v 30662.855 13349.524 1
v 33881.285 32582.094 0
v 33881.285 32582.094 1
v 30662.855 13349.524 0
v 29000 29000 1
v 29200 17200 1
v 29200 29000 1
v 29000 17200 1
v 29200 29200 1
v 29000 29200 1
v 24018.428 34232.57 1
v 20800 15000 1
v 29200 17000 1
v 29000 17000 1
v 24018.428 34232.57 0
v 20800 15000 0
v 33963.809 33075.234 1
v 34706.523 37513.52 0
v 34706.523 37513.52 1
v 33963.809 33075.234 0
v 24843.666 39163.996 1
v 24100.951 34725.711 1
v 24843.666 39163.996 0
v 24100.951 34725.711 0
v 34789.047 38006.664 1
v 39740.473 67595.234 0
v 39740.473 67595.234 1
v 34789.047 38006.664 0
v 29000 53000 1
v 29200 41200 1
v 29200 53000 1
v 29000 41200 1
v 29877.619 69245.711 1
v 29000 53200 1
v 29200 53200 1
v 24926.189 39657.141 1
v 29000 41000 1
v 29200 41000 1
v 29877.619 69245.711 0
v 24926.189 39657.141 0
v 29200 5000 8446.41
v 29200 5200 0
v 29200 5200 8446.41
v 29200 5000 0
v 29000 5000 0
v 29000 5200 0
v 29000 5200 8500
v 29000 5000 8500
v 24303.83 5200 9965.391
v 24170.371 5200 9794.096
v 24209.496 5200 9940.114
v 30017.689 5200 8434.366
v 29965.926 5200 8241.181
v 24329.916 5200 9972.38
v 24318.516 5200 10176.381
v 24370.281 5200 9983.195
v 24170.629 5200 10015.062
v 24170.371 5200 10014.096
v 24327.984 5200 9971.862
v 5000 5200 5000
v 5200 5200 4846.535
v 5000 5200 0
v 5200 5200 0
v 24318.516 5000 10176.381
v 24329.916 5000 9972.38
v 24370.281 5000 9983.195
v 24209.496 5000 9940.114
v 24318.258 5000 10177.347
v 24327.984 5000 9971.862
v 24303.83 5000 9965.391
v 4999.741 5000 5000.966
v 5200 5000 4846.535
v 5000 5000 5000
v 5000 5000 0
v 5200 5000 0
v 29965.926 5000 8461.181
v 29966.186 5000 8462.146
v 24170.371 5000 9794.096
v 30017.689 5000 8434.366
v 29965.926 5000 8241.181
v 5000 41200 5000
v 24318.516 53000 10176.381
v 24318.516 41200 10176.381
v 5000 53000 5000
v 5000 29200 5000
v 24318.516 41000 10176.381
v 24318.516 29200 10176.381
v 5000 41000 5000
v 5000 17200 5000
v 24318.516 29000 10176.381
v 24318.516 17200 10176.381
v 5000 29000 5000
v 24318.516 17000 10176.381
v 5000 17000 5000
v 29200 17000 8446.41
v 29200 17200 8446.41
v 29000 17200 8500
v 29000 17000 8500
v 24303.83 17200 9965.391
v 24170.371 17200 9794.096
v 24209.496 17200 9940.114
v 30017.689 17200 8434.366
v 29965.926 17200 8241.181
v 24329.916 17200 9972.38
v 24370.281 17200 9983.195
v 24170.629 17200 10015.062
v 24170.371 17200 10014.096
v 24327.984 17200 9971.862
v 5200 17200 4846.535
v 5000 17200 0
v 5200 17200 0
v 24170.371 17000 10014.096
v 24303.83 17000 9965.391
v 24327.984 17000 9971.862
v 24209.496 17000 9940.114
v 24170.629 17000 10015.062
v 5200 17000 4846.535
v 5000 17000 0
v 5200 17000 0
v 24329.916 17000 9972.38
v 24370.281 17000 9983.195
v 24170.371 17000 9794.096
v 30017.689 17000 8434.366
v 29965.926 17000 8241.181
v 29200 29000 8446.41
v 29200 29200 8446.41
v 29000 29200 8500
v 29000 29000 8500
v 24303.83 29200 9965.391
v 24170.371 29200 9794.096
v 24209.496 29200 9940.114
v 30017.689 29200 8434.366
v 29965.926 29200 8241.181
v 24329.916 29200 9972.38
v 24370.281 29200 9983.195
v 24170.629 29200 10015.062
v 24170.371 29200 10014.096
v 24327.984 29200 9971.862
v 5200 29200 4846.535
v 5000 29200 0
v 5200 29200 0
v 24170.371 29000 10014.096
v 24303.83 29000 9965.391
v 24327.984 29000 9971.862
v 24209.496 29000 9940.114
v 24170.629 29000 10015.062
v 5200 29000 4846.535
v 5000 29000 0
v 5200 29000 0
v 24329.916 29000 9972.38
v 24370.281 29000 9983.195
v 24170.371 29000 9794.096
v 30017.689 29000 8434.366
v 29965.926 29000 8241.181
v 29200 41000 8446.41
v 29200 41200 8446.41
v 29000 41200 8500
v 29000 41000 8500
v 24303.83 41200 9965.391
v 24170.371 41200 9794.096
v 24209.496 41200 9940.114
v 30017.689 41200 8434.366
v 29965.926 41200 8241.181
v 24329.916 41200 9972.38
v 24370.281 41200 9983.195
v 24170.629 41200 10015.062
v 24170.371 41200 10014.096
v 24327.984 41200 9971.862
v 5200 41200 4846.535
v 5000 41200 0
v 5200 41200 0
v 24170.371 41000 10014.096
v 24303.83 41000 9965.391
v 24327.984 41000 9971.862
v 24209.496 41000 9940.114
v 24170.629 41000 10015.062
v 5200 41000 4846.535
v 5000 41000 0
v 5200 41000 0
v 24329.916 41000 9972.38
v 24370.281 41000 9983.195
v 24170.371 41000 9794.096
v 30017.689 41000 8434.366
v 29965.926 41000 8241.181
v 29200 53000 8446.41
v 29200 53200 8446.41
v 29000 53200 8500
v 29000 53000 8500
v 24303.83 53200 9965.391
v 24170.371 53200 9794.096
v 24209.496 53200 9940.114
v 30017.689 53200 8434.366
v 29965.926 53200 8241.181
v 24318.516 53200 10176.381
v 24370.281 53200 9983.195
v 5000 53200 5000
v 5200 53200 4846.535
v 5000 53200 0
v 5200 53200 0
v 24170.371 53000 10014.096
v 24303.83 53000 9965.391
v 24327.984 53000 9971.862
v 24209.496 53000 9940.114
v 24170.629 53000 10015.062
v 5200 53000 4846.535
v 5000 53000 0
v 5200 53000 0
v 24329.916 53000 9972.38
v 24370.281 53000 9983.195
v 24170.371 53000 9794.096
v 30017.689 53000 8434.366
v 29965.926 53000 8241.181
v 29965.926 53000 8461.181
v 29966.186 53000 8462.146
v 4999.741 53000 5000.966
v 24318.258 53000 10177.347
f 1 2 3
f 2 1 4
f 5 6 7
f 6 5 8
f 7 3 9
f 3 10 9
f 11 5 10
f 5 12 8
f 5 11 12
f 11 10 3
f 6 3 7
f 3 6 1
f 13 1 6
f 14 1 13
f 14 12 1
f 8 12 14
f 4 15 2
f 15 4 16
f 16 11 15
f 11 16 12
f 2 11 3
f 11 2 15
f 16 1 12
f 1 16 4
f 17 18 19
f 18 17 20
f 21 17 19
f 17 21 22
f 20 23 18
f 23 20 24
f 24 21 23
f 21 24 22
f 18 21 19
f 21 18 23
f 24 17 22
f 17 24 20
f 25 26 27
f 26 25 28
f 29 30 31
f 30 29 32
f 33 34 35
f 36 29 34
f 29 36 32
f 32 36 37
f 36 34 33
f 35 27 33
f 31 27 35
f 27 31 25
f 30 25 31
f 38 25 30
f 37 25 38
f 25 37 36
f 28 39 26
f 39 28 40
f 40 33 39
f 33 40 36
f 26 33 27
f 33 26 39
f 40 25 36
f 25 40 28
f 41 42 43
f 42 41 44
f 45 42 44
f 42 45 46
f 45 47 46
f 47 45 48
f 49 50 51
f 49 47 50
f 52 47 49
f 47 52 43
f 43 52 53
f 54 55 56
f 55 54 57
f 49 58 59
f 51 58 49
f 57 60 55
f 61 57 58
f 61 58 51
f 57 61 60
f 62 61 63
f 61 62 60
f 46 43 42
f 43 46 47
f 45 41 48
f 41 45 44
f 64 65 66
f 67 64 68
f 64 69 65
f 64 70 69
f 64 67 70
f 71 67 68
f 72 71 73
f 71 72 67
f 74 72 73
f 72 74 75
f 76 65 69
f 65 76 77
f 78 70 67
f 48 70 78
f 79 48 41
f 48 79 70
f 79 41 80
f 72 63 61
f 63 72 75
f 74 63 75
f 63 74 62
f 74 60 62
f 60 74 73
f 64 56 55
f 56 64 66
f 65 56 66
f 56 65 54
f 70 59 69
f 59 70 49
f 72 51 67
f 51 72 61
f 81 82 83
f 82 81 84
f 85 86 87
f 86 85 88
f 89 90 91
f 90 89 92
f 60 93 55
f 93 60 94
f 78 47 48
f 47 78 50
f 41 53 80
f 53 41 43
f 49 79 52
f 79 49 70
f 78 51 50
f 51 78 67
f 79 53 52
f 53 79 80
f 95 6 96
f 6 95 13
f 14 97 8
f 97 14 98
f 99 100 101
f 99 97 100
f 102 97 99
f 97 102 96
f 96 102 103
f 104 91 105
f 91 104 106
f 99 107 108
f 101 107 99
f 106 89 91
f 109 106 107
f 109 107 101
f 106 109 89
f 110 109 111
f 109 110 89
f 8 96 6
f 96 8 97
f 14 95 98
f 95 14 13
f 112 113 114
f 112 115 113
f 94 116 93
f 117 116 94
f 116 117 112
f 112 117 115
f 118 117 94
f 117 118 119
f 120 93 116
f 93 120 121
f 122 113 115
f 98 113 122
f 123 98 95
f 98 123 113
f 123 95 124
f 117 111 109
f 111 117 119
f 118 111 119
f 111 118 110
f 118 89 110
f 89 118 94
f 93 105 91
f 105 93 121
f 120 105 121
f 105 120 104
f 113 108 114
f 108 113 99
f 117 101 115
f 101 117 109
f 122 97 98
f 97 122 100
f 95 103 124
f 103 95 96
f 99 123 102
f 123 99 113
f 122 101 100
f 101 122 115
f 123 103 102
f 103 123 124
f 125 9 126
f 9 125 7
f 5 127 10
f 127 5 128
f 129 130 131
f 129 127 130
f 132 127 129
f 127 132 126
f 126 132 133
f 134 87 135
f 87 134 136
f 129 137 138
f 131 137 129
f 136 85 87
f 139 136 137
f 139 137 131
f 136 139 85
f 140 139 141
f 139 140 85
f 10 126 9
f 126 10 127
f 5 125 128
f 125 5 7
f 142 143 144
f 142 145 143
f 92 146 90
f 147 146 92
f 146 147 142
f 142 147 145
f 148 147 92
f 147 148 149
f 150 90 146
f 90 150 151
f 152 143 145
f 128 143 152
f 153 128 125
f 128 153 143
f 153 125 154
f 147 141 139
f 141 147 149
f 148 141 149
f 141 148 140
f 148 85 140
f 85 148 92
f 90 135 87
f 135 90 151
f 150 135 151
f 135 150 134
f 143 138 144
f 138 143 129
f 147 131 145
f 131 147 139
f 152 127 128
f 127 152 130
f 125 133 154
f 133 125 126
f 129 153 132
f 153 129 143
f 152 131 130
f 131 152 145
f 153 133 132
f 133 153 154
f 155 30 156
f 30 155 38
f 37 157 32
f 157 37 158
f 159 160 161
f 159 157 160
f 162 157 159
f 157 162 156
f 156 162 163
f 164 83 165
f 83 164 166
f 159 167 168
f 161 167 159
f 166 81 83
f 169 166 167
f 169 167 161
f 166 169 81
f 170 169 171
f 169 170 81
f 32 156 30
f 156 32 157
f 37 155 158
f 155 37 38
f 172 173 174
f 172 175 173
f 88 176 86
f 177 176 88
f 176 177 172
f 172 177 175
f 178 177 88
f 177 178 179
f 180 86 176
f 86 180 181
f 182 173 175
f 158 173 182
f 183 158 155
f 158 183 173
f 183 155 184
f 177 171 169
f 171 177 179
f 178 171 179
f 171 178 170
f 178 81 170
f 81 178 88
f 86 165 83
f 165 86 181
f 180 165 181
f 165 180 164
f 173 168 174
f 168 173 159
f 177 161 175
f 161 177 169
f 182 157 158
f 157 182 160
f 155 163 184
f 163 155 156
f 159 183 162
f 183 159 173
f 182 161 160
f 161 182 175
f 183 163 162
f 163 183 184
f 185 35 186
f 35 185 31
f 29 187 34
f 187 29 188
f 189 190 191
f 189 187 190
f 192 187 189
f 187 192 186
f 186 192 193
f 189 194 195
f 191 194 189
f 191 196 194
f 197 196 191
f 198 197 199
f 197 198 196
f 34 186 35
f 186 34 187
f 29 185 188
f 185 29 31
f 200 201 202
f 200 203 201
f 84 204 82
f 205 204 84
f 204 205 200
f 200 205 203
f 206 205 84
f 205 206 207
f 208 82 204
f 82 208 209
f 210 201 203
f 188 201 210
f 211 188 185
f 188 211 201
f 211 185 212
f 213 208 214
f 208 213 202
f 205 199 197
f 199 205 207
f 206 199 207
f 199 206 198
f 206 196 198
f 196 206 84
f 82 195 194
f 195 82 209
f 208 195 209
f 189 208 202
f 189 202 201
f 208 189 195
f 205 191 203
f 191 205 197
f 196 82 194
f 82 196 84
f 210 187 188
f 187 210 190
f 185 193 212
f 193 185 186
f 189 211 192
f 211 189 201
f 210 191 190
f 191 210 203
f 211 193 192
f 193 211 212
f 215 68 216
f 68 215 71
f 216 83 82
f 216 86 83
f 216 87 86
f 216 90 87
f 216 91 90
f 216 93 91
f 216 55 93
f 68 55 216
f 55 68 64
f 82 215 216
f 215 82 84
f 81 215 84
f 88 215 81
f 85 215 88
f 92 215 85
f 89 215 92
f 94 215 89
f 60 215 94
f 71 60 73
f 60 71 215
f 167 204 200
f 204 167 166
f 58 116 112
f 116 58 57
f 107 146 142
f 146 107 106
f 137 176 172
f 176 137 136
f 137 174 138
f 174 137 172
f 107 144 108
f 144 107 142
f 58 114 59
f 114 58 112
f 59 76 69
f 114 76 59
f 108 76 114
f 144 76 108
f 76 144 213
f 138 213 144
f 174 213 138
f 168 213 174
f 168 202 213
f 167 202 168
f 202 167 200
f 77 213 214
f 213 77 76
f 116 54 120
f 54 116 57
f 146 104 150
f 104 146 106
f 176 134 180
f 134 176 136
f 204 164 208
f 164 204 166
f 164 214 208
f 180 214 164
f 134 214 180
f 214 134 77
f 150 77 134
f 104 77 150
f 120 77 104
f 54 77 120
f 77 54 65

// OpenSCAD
o_hangar_lg=10000;
o_hangar_l=55000;
o_hangar_h=6000;
o_hangar_t = 5000;

toit = true;

module o_trave(){
    translate([0/2, 0])cube([200,200, o_hangar_h]);
    translate([o_hangar_lg, 0])cube([200,200, o_hangar_h]);
    translate([0, 0, o_hangar_h]) rotate([0,90-30,0])cube([200,200, 5600]);
    translate([o_hangar_lg+3000, 0, 5000]) rotate([0,-90+25,0])cube([200,200, 9000]);
}


module o_hangar(){
    translate([0, 0, 0]) cube([o_hangar_lg,        o_hangar_l, 1]);
    for(i=[0:11]){
        translate([0, i*o_hangar_t, 0]) o_trave();
    }
    
    if(toit){
        translate([0, 0, o_hangar_h]) rotate([0,-30,0])cube([5600,o_hangar_l, 1]);
        translate([o_hangar_lg+3000, 0, 5000+200]) rotate([0,180+25,0])cube([9000,o_hangar_l, 1]);
    }
}

module o_hangar_bas(){
    translate([0, 0, 0]) cube([o_hangar_lg, o_hangar_t*4-500, 1]);
    translate([0, o_hangar_t*4, 0]) cube([o_hangar_lg, o_hangar_t-500, 1]);
    translate([0, o_hangar_t*5, 0]) cube([o_hangar_lg, o_hangar_t*6, 1]);
}

module o_hangar2(){
    translate([0, 0, 0]) cube([o_hangar_lg, o_hangar_t*4-500, 1]);
    
    translate([0, o_hangar_t*4, 0]) union(){
        cube([o_hangar_lg, o_hangar_t*7, 1]);
        for(i=[0:7]){
            translate([0, i*o_hangar_t, 0]) o_trave();
        }
        
        if(toit){
            translate([0, 0, o_hangar_h]) rotate([0,-30,0])cube([5600,o_hangar_t*7, 1]);
            translate([o_hangar_lg+3000, 0, 5000+200]) rotate([0,180+25,0])cube([9000,o_hangar_t*7, 1]);
        }
    }
}





/*module trave_m(){
    translate([lg_hangar, 0])cube([200,200, h2]);
    translate([0, 0])cube([200,200, h1]);
    translate([0, 0, h1]) rotate([0,90-angle,0])cube([200,200, l3]);
    translate([lg_hangar, 0, h2]) rotate([0,-90+angle,0])cube([200,200, l4]);
    
}*/

/*module trave_b(){
    h_b = 7000;
    translate([lg_hangar, 0]) translate([-200, 0])cube([200,200, h_b]);
    translate([0, 0]) cube([200,200, h_b]);
    translate([0, 0, h_b]) rotate([0,90-22,0])cube([200,200, 9000]);
    translate([lg_hangar, 0, h_b]) rotate([0,-90+22,0]) translate([-200, 0])cube([200,200, 9000]);
    
}*/

h_b = 6000;
nb_travee = 7;
lg_hangar_b = 24000;
travee_l_b = 12000;
angle_b = 22/100*90;
l_toit_b = 11500;
l_hangar_b = nb_travee*travee_l_b;


module trave_b(){
    translate([lg_hangar_b, 0]) translate([-200, 0])cube([200,200, h_b]);
    translate([0, 0]) cube([200,200, h_b]);
    translate([0, 0, h_b]) rotate([0,90-angle_b,0])cube([200,200, l_toit_b]);
    translate([lg_hangar_b, 0, h_b]) rotate([0,-90+angle_b,0]) translate([-200, 0])cube([200,200, l_toit_b]);
    
}

module hangar_bipente(){
    for(i =[0:nb_travee]){
        translate([0, i*travee_l_b, 0]) trave_b();
    
    }
    if(toit){
        translate([0, 0, h_b]) rotate([0,-angle_b,0])cube([l_toit_b,l_hangar_b, 1]);
        translate([lg_hangar_b, 0, h_b]) rotate([0,-90+angle_b,0])cube([1,l_hangar_b, l_toit_b]);
    }
    
}


lg_hangar_m = 24000;
h1_m = 5000;
h2_m = 8500;

h_m_ = 9400;
l_m_ = 17500;

angle_m = 15;
l3_m = 20000;
l4_m = 6000;

travee_l1_m = 12000;
nb_travee_m = 4;
l_hangar_m = travee_l1_m*nb_travee_m;


module trave_m(){
    translate([lg_hangar_m, 0])cube([200,200, h2]);
    translate([0, 0])cube([200,200, h1]);
    translate([0, 0, h1]) rotate([0,90-angle,0])cube([200,200, l3_m]);
    translate([lg_hangar_m, 0, h2]) rotate([0,-90+angle,0])translate([0,0,-1000])cube([200,200, l4_m]);
}

module hangar_m(){
    ///translate([0, 0, 0]) cube([lg_hangar, l_hangar, 1]);

    for(i =[0:nb_travee_m]){
        translate([0, i*travee_l1_m, 0]) trave_m();
    
    }
    if(toit){
        translate([0, 0, h1]) rotate([0,-angle,0])cube([l3_m,l_hangar_m, 1]);
        translate([lg_hangar_m, 0, h2+220]) rotate([0,-90+angle,0])translate([0,0,-1000])cube([1,l_hangar_m, l4_m]);
    }
    
}

lg_hangar = 20000;
l_hangar = 84000;
h1 = 5000;
h2 = 8500;

h_ = 9400;
l_ = 17500;

angle = 15;
l3 = 18000;
l4 = 4000;

travee_l1 = 6000;

module trave_wolf(){
    translate([lg_hangar, 0])cube([200,200, h2]);
    translate([0, 0])cube([200,200, h1]);
    translate([0, 0, h1]) rotate([0,90-angle,0])cube([200,200, l3]);
    translate([lg_hangar, 0, h2]) rotate([0,-90+angle,0])translate([0,0,-1000])cube([200,200, l4]);
}

module hangar_wolf(){
    ///translate([0, 0, 0]) cube([lg_hangar, l_hangar, 1]);



    trave_wolf();
    translate([0, 2*travee_l1, 0]) trave_wolf();
    translate([0, 4*travee_l1, 0]) trave_wolf();
    translate([0, 6*travee_l1, 0]) trave_wolf();
    translate([0, 8*travee_l1, 0]) trave_wolf();
    translate([0, 10*travee_l1, 0]) trave_wolf();
    translate([0, 12*travee_l1, 0]) trave_wolf();
    translate([0, 14*travee_l1, 0]) trave_wolf();
    
    if(toit){
        translate([0, 0, h1]) rotate([0,-angle,0])cube([l3,l_hangar, 1]);
        translate([lg_hangar, 0, h2+220]) rotate([0,-90+angle,0])translate([0,0,-1000])cube([1,l_hangar, l4]);
    }
    
}


module f_wolf(){
    translate([lg_hangar, 0]) translate([-750,-750,-1500])cube([1500,1500, 1500]);
    translate([0, 0])translate([-750,-750,-1500])cube([1500,1500, 1500]);
}

module fondation_wolf(){
    translate([0, -150, -500]) cube([lg_hangar, 300, 300]);
    translate([0, 14*travee_l1-150, -500]) cube([lg_hangar, 300, 300]);
    translate([0, -150, -500]) cube([300, l_hangar, 300]);
    translate([lg_hangar, -150, -500]) cube([300, l_hangar, 300]);
    
    
    f_wolf();
    translate([0, 2*travee_l1, 0]) f_wolf();
    translate([0, 4*travee_l1, 0]) f_wolf();
    translate([0, 6*travee_l1, 0]) f_wolf();
    translate([0, 8*travee_l1, 0]) f_wolf();
    translate([0, 10*travee_l1, 0]) f_wolf();
    translate([0, 12*travee_l1, 0]) f_wolf();
    translate([0, 14*travee_l1, 0]) f_wolf();
    
    echo("plot");
    echo(8*2*1.5*1.5*1.5);
    echo((l_hangar+lg_hangar)*0.3*0.3*2/1000);
}

module benne(angle){
    e = 1;
    camion_l = 10600*e;
    camion_lg = 2500*e;
    camion_h = 3500*e;
    camion_h1 = 1000*e;
    angle_b = 20;
    
    rotate([0,0,-90])union(){
        translate([0,0,camion_h1]) rotate([angle,0,0])difference(){
            translate([-camion_lg/2,0,0])  cube([camion_lg, camion_l, camion_h-camion_h1]);
            translate([-camion_lg/2+1,1,1])  cube([camion_lg-2, camion_l-2, camion_h-camion_h1+1]);
        }
        translate([-camion_lg/2,0,camion_h1])  cube([camion_lg, camion_l, 100]);
        translate([-camion_lg/2,2000*e,500*e]) rotate([0,90,0]) cylinder(r=500*e, camion_lg);
        translate([-camion_lg/2,3000*e,500*e]) rotate([0,90,0]) cylinder(r=500*e, camion_lg);
        translate([-camion_lg/2,4000*e,500*e]) rotate([0,90,0]) cylinder(r=500*e, camion_lg);
    }
}

module trave_beton(){
    cube([200,12000,2000]);
    cube([20000,200,2000]);
    translate ([0,0,-200])cube([20000,12000,200]);
    translate ([0,12000,0]) cube([20000,200,2000]);
}

module trave_ventille(){
    translate ([0,6000,0]) cube([17000,400,800]);
    
    for(i =[0:7]){
        
        translate ([1000,800 +i*1500,-300]) cube([15000,300,350]);
    }
}


module trave_elevateur(){
    translate ([0,12000,0]) cube([20000,200,2000]);
    
    //fosse
    translate ([12000,1000,30]) hull(){
        cube([4000,4000,35]);
        translate ([0,2000, -3000]) cube([30,30,30]);
    }
    
    //elevateur
    translate ([10000,1000,30]) cube([1500,4000,35]);
    
    
    translate ([11000,3000,-4000]) cube([400,400,12000]);
    translate ([10000,-10000,7000]) cube([300,15000,350]);
}

mode = 1;

 /*translate([8100, 0000]) rotate([0,0,-9.5])union(){
        %polygon([[0,0], [-8600, 0],  [-9600, 8000], [-0, 7800]]);
        %polygon([[-0, 7800], [-9600, 8000],  [-20500,72300], [-0, 78350]]);

        translate([10000, 17000, 0]) o_hangar();
    }*/
    

if(mode == 0){
    %polygon([[0, 8300], [0, 74300],  [20800,76500], [9600, 6600]]);
    

    
    
} else if(mode == 1){
    %polygon([[0, 8300], [0, 74300],  [20800,76500], [9600, 6600]]);
    %translate([20800, 15000]) rotate([0,0,-9.5])o_hangar();
    translate([20800, 15000]) rotate([0,0,-9.5]) o_hangar_bas();
    translate([5000, 5000]) hangar_m();
} else if(mode == 2){
    %translate([10000, 17000, 0]) o_hangar();
    
    translate([-8500+5000, 4000]) rotate([0, 0, 9]) union(){
        color("gray")fondation_wolf();
    }
}else if(mode == 3){
    translate([5000, 4000])union(){
        //hangar_wolf();
        hangar_screb();
        %translate([-1000, 0])  translate([5000, 3000])benne(30);
        color("gray")fondation_wolf();
    }
     %translate([8100, 0000]) rotate([0,0,-9.5]) translate([10000, 17000, 0]) o_hangar();
   
} else if(mode == 4){
    translate([-8500+5000, 4000]) rotate([0, 0, 9]) union(){
        hangar_wolf();
        color("gray")fondation_wolf();
        %translate([-1000, 0])  translate([5000, 3000])benne(25);
        color("gray") trave_beton();
        color("gray") translate([0, 12000])trave_beton();
        color("blue") translate([0, 12000]) trave_ventille();
    
        
    }
} else if(mode == 10){
    %polygon([[0,0], [-8600, 0],  [-9600, 8000], [-0, 7800]]);
    %polygon([[-0, 7800], [-9600, 8000],  [-20500,72300], [-0, 78350]]);%translate([10000, 17000, 0]) o_hangar();
    
    translate([-8500+5000, 4000]) rotate([0, 0, 9]) union(){
        color("gray")fondation_wolf();
    }
}   else {
    hangar_wolf();
        color("gray")fondation_wolf();
        %translate([-1000, 0])  translate([5000, 3000])benne(25);
        color("gray") trave_beton();
        color("gray") translate([0, 12000])trave_beton();
        color("blue") translate([0, 12000]) trave_ventille();
    color("green") translate([0, 24000]) trave_elevateur();
} 
